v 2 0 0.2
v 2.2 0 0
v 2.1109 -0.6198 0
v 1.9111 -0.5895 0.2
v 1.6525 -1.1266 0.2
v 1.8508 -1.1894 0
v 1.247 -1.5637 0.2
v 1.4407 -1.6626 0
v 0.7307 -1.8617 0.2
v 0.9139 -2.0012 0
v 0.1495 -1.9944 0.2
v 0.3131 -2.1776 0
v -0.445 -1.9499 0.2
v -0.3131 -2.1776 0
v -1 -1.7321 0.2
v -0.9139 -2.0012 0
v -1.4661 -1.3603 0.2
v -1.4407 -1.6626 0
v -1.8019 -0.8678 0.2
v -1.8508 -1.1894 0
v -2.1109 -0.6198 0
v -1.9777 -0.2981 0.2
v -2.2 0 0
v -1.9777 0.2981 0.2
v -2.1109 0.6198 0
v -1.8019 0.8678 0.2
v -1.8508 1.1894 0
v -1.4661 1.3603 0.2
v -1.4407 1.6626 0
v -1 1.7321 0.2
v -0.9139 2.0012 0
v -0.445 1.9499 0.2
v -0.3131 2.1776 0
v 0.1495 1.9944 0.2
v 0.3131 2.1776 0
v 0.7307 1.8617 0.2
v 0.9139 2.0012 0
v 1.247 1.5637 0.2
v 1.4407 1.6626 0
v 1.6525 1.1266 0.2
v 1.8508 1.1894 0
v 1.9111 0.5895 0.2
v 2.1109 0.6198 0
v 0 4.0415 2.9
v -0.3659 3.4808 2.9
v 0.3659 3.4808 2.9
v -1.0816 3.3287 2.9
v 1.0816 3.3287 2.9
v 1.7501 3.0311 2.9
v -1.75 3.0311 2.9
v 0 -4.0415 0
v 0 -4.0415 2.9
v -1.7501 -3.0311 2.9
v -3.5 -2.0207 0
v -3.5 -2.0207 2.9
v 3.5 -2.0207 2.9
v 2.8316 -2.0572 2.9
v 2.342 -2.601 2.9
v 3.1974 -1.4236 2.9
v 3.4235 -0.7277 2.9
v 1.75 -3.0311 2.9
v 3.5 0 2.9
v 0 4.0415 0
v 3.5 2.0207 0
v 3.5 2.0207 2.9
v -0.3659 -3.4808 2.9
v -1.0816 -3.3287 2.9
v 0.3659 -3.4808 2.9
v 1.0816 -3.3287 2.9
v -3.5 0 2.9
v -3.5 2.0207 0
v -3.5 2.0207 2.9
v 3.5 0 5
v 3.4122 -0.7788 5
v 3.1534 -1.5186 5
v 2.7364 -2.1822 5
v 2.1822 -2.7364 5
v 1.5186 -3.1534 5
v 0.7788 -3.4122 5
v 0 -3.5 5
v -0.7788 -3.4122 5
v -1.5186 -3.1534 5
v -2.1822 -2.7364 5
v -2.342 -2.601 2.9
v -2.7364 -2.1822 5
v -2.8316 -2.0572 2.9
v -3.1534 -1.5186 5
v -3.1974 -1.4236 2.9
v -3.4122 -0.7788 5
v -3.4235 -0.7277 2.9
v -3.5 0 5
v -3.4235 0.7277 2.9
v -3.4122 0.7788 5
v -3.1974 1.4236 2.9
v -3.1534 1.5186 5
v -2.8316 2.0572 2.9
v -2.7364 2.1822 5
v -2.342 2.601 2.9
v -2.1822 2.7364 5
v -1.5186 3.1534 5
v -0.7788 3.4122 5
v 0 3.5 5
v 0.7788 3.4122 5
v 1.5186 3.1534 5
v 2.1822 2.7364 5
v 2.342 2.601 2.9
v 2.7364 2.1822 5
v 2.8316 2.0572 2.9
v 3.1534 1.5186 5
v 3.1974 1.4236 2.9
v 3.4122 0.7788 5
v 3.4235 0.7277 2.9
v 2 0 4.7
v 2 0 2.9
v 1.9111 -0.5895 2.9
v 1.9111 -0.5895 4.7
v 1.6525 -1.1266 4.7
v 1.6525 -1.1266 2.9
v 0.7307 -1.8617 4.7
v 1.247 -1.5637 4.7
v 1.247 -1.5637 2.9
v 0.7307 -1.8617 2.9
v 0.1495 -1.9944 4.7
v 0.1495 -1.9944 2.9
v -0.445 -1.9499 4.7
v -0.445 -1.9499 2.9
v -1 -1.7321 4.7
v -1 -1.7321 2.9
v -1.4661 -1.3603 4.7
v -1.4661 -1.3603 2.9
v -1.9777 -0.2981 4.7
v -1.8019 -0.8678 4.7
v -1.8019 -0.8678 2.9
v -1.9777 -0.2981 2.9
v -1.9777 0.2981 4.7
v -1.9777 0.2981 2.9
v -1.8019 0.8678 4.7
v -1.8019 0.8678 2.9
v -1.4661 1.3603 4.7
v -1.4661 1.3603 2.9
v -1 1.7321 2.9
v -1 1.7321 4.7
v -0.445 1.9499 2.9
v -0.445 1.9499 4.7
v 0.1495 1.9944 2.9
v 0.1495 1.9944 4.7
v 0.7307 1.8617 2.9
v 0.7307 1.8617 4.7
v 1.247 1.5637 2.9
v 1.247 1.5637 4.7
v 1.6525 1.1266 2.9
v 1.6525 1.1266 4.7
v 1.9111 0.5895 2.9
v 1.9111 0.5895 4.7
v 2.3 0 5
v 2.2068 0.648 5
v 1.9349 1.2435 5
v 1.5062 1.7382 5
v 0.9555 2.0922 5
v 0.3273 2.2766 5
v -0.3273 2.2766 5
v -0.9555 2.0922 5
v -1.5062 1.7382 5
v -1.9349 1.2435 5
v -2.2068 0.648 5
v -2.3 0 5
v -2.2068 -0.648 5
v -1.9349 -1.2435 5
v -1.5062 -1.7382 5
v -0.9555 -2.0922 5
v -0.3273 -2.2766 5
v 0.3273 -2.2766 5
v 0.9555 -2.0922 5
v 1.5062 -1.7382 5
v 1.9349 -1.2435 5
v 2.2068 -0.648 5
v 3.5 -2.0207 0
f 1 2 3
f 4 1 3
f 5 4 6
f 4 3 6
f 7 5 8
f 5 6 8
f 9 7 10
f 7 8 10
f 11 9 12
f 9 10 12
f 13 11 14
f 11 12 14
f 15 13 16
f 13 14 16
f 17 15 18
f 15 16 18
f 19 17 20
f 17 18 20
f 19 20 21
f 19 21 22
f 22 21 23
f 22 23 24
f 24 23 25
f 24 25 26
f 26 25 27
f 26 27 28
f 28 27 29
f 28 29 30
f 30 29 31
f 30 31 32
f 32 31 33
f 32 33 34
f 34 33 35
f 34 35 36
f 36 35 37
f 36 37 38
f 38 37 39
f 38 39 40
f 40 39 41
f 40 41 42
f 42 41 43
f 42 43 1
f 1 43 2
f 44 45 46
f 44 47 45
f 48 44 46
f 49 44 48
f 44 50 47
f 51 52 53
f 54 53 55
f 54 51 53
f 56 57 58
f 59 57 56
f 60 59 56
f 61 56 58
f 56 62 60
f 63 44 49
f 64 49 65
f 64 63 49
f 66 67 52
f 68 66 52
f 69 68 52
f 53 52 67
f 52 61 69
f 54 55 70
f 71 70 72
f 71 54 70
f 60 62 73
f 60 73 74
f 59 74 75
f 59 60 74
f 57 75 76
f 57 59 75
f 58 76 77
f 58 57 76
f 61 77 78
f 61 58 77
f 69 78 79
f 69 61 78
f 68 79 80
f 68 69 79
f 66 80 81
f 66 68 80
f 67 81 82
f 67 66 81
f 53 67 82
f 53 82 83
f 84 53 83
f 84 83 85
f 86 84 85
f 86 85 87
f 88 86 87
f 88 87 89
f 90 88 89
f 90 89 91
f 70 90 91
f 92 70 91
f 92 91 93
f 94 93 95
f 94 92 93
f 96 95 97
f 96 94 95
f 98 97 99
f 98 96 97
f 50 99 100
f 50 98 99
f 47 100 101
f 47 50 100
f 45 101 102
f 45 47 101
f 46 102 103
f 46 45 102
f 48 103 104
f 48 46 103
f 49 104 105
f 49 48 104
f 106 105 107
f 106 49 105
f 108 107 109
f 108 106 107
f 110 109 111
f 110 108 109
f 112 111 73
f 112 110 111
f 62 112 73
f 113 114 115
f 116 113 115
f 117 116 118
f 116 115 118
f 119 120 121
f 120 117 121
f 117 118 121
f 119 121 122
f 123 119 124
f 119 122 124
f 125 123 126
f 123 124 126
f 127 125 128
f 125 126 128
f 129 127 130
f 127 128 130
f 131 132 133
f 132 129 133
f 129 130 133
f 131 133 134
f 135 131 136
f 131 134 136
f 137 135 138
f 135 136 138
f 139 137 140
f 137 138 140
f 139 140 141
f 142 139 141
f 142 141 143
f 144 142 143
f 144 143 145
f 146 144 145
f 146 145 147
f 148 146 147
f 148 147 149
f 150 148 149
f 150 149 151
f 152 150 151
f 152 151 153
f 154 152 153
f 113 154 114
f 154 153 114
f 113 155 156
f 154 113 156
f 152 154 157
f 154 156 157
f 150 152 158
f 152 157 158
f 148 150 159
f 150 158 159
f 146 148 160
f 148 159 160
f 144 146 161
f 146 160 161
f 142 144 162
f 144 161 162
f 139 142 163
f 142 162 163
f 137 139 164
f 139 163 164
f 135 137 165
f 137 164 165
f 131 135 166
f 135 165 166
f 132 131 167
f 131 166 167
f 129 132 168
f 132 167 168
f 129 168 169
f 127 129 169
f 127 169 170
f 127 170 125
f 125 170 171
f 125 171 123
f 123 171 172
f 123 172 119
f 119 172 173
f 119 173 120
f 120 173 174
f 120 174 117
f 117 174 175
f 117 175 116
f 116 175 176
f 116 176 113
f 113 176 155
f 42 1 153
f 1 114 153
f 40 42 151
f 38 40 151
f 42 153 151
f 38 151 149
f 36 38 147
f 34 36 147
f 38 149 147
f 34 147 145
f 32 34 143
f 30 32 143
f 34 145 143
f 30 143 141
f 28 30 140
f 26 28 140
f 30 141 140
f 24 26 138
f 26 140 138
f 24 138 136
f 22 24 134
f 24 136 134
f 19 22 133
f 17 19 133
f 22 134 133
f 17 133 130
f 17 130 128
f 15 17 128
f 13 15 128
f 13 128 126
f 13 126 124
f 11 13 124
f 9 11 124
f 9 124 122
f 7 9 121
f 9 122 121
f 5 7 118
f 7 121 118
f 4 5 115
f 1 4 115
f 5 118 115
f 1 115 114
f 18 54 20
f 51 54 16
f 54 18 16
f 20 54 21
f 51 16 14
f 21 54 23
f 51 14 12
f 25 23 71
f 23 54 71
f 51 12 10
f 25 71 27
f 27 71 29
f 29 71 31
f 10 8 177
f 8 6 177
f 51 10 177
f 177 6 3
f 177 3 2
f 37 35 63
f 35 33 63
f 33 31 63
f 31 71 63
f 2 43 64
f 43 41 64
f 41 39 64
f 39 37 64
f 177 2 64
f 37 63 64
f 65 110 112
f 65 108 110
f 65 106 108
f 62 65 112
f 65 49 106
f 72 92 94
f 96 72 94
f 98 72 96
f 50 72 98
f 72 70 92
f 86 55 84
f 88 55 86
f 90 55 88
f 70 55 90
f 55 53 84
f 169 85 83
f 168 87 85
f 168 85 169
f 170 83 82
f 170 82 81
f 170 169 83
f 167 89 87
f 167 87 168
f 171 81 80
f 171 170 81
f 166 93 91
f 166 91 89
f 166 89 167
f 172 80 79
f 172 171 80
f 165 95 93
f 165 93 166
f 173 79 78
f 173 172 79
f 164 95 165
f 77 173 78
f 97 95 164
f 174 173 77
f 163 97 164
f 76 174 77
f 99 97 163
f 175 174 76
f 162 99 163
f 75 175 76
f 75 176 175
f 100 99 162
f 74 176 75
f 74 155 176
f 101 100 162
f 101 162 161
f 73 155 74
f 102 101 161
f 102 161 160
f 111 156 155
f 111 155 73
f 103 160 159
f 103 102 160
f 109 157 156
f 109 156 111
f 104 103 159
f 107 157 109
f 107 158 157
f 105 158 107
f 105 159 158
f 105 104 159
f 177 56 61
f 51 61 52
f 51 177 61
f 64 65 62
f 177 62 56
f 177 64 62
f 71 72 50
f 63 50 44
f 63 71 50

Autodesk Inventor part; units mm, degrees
ref_plane "YZ Plane" through (0, 0, 0) normal (1, 0, 0) x (0, 1, 0)
ref_plane "XZ Plane" through (0, 0, 0) normal (0, 1, 0) x (-1, 0, 0)
ref_plane "XY Plane" through (0, 0, 0) normal (0, 0, 1) x (1, 0, 0)
sketch "Sketch1" plane through (0, 0, 0) normal (0, 0, 1) x (1, 0, 0)
  line L0 (0, 4.0415) -> (3.5, 2.0207)
  line L1 (3.5, 2.0207) -> (3.5, -2.0207)
  line L2 (3.5, -2.0207) -> (0, -4.0415)
  line L3 (0, -4.0415) -> (-3.5, -2.0207)
  line L4 (-3.5, -2.0207) -> (-3.5, 2.0207)
  line L5 (-3.5, 2.0207) -> (0, 4.0415)
  point P0 (0, 0)
  point P1 (0, 0)
  dimension "d0" = 7
extrude "Extrusion1" add sketch "Sketch1" along normal blind 2.9
sketch "Sketch2" plane through (0, 0, 2.9) normal (0, 0, 1) x (1, 0, 0)
  circle A0 centre (0, 0) radius 2
  dimension "d3" = 4
extrude "Extrusion2" cut sketch "Sketch2" against normal blind 5
sketch "Sketch3" plane through (0, 0, 2.9) normal (0, 0, 1) x (1, 0, 0)
  circle A0 centre (0, 0) radius 3.5
  circle A1 centre (0, 0) radius 2 projected
extrude "Extrusion3" add sketch "Sketch3" along normal blind 2.1
chamfer "Chamfer1" distance 0.2 angle 45 1 edges at (-2, 0, 0)
thread "Thread1" size "M4x0.7" class "6H" standard "ANSI Metric M Profile" length 4
chamfer "Chamfer2" distance 0.3 angle 45 1 edges at (-2, 0, 5)
properties part number "P88044_Nylor_Nut_M4"
